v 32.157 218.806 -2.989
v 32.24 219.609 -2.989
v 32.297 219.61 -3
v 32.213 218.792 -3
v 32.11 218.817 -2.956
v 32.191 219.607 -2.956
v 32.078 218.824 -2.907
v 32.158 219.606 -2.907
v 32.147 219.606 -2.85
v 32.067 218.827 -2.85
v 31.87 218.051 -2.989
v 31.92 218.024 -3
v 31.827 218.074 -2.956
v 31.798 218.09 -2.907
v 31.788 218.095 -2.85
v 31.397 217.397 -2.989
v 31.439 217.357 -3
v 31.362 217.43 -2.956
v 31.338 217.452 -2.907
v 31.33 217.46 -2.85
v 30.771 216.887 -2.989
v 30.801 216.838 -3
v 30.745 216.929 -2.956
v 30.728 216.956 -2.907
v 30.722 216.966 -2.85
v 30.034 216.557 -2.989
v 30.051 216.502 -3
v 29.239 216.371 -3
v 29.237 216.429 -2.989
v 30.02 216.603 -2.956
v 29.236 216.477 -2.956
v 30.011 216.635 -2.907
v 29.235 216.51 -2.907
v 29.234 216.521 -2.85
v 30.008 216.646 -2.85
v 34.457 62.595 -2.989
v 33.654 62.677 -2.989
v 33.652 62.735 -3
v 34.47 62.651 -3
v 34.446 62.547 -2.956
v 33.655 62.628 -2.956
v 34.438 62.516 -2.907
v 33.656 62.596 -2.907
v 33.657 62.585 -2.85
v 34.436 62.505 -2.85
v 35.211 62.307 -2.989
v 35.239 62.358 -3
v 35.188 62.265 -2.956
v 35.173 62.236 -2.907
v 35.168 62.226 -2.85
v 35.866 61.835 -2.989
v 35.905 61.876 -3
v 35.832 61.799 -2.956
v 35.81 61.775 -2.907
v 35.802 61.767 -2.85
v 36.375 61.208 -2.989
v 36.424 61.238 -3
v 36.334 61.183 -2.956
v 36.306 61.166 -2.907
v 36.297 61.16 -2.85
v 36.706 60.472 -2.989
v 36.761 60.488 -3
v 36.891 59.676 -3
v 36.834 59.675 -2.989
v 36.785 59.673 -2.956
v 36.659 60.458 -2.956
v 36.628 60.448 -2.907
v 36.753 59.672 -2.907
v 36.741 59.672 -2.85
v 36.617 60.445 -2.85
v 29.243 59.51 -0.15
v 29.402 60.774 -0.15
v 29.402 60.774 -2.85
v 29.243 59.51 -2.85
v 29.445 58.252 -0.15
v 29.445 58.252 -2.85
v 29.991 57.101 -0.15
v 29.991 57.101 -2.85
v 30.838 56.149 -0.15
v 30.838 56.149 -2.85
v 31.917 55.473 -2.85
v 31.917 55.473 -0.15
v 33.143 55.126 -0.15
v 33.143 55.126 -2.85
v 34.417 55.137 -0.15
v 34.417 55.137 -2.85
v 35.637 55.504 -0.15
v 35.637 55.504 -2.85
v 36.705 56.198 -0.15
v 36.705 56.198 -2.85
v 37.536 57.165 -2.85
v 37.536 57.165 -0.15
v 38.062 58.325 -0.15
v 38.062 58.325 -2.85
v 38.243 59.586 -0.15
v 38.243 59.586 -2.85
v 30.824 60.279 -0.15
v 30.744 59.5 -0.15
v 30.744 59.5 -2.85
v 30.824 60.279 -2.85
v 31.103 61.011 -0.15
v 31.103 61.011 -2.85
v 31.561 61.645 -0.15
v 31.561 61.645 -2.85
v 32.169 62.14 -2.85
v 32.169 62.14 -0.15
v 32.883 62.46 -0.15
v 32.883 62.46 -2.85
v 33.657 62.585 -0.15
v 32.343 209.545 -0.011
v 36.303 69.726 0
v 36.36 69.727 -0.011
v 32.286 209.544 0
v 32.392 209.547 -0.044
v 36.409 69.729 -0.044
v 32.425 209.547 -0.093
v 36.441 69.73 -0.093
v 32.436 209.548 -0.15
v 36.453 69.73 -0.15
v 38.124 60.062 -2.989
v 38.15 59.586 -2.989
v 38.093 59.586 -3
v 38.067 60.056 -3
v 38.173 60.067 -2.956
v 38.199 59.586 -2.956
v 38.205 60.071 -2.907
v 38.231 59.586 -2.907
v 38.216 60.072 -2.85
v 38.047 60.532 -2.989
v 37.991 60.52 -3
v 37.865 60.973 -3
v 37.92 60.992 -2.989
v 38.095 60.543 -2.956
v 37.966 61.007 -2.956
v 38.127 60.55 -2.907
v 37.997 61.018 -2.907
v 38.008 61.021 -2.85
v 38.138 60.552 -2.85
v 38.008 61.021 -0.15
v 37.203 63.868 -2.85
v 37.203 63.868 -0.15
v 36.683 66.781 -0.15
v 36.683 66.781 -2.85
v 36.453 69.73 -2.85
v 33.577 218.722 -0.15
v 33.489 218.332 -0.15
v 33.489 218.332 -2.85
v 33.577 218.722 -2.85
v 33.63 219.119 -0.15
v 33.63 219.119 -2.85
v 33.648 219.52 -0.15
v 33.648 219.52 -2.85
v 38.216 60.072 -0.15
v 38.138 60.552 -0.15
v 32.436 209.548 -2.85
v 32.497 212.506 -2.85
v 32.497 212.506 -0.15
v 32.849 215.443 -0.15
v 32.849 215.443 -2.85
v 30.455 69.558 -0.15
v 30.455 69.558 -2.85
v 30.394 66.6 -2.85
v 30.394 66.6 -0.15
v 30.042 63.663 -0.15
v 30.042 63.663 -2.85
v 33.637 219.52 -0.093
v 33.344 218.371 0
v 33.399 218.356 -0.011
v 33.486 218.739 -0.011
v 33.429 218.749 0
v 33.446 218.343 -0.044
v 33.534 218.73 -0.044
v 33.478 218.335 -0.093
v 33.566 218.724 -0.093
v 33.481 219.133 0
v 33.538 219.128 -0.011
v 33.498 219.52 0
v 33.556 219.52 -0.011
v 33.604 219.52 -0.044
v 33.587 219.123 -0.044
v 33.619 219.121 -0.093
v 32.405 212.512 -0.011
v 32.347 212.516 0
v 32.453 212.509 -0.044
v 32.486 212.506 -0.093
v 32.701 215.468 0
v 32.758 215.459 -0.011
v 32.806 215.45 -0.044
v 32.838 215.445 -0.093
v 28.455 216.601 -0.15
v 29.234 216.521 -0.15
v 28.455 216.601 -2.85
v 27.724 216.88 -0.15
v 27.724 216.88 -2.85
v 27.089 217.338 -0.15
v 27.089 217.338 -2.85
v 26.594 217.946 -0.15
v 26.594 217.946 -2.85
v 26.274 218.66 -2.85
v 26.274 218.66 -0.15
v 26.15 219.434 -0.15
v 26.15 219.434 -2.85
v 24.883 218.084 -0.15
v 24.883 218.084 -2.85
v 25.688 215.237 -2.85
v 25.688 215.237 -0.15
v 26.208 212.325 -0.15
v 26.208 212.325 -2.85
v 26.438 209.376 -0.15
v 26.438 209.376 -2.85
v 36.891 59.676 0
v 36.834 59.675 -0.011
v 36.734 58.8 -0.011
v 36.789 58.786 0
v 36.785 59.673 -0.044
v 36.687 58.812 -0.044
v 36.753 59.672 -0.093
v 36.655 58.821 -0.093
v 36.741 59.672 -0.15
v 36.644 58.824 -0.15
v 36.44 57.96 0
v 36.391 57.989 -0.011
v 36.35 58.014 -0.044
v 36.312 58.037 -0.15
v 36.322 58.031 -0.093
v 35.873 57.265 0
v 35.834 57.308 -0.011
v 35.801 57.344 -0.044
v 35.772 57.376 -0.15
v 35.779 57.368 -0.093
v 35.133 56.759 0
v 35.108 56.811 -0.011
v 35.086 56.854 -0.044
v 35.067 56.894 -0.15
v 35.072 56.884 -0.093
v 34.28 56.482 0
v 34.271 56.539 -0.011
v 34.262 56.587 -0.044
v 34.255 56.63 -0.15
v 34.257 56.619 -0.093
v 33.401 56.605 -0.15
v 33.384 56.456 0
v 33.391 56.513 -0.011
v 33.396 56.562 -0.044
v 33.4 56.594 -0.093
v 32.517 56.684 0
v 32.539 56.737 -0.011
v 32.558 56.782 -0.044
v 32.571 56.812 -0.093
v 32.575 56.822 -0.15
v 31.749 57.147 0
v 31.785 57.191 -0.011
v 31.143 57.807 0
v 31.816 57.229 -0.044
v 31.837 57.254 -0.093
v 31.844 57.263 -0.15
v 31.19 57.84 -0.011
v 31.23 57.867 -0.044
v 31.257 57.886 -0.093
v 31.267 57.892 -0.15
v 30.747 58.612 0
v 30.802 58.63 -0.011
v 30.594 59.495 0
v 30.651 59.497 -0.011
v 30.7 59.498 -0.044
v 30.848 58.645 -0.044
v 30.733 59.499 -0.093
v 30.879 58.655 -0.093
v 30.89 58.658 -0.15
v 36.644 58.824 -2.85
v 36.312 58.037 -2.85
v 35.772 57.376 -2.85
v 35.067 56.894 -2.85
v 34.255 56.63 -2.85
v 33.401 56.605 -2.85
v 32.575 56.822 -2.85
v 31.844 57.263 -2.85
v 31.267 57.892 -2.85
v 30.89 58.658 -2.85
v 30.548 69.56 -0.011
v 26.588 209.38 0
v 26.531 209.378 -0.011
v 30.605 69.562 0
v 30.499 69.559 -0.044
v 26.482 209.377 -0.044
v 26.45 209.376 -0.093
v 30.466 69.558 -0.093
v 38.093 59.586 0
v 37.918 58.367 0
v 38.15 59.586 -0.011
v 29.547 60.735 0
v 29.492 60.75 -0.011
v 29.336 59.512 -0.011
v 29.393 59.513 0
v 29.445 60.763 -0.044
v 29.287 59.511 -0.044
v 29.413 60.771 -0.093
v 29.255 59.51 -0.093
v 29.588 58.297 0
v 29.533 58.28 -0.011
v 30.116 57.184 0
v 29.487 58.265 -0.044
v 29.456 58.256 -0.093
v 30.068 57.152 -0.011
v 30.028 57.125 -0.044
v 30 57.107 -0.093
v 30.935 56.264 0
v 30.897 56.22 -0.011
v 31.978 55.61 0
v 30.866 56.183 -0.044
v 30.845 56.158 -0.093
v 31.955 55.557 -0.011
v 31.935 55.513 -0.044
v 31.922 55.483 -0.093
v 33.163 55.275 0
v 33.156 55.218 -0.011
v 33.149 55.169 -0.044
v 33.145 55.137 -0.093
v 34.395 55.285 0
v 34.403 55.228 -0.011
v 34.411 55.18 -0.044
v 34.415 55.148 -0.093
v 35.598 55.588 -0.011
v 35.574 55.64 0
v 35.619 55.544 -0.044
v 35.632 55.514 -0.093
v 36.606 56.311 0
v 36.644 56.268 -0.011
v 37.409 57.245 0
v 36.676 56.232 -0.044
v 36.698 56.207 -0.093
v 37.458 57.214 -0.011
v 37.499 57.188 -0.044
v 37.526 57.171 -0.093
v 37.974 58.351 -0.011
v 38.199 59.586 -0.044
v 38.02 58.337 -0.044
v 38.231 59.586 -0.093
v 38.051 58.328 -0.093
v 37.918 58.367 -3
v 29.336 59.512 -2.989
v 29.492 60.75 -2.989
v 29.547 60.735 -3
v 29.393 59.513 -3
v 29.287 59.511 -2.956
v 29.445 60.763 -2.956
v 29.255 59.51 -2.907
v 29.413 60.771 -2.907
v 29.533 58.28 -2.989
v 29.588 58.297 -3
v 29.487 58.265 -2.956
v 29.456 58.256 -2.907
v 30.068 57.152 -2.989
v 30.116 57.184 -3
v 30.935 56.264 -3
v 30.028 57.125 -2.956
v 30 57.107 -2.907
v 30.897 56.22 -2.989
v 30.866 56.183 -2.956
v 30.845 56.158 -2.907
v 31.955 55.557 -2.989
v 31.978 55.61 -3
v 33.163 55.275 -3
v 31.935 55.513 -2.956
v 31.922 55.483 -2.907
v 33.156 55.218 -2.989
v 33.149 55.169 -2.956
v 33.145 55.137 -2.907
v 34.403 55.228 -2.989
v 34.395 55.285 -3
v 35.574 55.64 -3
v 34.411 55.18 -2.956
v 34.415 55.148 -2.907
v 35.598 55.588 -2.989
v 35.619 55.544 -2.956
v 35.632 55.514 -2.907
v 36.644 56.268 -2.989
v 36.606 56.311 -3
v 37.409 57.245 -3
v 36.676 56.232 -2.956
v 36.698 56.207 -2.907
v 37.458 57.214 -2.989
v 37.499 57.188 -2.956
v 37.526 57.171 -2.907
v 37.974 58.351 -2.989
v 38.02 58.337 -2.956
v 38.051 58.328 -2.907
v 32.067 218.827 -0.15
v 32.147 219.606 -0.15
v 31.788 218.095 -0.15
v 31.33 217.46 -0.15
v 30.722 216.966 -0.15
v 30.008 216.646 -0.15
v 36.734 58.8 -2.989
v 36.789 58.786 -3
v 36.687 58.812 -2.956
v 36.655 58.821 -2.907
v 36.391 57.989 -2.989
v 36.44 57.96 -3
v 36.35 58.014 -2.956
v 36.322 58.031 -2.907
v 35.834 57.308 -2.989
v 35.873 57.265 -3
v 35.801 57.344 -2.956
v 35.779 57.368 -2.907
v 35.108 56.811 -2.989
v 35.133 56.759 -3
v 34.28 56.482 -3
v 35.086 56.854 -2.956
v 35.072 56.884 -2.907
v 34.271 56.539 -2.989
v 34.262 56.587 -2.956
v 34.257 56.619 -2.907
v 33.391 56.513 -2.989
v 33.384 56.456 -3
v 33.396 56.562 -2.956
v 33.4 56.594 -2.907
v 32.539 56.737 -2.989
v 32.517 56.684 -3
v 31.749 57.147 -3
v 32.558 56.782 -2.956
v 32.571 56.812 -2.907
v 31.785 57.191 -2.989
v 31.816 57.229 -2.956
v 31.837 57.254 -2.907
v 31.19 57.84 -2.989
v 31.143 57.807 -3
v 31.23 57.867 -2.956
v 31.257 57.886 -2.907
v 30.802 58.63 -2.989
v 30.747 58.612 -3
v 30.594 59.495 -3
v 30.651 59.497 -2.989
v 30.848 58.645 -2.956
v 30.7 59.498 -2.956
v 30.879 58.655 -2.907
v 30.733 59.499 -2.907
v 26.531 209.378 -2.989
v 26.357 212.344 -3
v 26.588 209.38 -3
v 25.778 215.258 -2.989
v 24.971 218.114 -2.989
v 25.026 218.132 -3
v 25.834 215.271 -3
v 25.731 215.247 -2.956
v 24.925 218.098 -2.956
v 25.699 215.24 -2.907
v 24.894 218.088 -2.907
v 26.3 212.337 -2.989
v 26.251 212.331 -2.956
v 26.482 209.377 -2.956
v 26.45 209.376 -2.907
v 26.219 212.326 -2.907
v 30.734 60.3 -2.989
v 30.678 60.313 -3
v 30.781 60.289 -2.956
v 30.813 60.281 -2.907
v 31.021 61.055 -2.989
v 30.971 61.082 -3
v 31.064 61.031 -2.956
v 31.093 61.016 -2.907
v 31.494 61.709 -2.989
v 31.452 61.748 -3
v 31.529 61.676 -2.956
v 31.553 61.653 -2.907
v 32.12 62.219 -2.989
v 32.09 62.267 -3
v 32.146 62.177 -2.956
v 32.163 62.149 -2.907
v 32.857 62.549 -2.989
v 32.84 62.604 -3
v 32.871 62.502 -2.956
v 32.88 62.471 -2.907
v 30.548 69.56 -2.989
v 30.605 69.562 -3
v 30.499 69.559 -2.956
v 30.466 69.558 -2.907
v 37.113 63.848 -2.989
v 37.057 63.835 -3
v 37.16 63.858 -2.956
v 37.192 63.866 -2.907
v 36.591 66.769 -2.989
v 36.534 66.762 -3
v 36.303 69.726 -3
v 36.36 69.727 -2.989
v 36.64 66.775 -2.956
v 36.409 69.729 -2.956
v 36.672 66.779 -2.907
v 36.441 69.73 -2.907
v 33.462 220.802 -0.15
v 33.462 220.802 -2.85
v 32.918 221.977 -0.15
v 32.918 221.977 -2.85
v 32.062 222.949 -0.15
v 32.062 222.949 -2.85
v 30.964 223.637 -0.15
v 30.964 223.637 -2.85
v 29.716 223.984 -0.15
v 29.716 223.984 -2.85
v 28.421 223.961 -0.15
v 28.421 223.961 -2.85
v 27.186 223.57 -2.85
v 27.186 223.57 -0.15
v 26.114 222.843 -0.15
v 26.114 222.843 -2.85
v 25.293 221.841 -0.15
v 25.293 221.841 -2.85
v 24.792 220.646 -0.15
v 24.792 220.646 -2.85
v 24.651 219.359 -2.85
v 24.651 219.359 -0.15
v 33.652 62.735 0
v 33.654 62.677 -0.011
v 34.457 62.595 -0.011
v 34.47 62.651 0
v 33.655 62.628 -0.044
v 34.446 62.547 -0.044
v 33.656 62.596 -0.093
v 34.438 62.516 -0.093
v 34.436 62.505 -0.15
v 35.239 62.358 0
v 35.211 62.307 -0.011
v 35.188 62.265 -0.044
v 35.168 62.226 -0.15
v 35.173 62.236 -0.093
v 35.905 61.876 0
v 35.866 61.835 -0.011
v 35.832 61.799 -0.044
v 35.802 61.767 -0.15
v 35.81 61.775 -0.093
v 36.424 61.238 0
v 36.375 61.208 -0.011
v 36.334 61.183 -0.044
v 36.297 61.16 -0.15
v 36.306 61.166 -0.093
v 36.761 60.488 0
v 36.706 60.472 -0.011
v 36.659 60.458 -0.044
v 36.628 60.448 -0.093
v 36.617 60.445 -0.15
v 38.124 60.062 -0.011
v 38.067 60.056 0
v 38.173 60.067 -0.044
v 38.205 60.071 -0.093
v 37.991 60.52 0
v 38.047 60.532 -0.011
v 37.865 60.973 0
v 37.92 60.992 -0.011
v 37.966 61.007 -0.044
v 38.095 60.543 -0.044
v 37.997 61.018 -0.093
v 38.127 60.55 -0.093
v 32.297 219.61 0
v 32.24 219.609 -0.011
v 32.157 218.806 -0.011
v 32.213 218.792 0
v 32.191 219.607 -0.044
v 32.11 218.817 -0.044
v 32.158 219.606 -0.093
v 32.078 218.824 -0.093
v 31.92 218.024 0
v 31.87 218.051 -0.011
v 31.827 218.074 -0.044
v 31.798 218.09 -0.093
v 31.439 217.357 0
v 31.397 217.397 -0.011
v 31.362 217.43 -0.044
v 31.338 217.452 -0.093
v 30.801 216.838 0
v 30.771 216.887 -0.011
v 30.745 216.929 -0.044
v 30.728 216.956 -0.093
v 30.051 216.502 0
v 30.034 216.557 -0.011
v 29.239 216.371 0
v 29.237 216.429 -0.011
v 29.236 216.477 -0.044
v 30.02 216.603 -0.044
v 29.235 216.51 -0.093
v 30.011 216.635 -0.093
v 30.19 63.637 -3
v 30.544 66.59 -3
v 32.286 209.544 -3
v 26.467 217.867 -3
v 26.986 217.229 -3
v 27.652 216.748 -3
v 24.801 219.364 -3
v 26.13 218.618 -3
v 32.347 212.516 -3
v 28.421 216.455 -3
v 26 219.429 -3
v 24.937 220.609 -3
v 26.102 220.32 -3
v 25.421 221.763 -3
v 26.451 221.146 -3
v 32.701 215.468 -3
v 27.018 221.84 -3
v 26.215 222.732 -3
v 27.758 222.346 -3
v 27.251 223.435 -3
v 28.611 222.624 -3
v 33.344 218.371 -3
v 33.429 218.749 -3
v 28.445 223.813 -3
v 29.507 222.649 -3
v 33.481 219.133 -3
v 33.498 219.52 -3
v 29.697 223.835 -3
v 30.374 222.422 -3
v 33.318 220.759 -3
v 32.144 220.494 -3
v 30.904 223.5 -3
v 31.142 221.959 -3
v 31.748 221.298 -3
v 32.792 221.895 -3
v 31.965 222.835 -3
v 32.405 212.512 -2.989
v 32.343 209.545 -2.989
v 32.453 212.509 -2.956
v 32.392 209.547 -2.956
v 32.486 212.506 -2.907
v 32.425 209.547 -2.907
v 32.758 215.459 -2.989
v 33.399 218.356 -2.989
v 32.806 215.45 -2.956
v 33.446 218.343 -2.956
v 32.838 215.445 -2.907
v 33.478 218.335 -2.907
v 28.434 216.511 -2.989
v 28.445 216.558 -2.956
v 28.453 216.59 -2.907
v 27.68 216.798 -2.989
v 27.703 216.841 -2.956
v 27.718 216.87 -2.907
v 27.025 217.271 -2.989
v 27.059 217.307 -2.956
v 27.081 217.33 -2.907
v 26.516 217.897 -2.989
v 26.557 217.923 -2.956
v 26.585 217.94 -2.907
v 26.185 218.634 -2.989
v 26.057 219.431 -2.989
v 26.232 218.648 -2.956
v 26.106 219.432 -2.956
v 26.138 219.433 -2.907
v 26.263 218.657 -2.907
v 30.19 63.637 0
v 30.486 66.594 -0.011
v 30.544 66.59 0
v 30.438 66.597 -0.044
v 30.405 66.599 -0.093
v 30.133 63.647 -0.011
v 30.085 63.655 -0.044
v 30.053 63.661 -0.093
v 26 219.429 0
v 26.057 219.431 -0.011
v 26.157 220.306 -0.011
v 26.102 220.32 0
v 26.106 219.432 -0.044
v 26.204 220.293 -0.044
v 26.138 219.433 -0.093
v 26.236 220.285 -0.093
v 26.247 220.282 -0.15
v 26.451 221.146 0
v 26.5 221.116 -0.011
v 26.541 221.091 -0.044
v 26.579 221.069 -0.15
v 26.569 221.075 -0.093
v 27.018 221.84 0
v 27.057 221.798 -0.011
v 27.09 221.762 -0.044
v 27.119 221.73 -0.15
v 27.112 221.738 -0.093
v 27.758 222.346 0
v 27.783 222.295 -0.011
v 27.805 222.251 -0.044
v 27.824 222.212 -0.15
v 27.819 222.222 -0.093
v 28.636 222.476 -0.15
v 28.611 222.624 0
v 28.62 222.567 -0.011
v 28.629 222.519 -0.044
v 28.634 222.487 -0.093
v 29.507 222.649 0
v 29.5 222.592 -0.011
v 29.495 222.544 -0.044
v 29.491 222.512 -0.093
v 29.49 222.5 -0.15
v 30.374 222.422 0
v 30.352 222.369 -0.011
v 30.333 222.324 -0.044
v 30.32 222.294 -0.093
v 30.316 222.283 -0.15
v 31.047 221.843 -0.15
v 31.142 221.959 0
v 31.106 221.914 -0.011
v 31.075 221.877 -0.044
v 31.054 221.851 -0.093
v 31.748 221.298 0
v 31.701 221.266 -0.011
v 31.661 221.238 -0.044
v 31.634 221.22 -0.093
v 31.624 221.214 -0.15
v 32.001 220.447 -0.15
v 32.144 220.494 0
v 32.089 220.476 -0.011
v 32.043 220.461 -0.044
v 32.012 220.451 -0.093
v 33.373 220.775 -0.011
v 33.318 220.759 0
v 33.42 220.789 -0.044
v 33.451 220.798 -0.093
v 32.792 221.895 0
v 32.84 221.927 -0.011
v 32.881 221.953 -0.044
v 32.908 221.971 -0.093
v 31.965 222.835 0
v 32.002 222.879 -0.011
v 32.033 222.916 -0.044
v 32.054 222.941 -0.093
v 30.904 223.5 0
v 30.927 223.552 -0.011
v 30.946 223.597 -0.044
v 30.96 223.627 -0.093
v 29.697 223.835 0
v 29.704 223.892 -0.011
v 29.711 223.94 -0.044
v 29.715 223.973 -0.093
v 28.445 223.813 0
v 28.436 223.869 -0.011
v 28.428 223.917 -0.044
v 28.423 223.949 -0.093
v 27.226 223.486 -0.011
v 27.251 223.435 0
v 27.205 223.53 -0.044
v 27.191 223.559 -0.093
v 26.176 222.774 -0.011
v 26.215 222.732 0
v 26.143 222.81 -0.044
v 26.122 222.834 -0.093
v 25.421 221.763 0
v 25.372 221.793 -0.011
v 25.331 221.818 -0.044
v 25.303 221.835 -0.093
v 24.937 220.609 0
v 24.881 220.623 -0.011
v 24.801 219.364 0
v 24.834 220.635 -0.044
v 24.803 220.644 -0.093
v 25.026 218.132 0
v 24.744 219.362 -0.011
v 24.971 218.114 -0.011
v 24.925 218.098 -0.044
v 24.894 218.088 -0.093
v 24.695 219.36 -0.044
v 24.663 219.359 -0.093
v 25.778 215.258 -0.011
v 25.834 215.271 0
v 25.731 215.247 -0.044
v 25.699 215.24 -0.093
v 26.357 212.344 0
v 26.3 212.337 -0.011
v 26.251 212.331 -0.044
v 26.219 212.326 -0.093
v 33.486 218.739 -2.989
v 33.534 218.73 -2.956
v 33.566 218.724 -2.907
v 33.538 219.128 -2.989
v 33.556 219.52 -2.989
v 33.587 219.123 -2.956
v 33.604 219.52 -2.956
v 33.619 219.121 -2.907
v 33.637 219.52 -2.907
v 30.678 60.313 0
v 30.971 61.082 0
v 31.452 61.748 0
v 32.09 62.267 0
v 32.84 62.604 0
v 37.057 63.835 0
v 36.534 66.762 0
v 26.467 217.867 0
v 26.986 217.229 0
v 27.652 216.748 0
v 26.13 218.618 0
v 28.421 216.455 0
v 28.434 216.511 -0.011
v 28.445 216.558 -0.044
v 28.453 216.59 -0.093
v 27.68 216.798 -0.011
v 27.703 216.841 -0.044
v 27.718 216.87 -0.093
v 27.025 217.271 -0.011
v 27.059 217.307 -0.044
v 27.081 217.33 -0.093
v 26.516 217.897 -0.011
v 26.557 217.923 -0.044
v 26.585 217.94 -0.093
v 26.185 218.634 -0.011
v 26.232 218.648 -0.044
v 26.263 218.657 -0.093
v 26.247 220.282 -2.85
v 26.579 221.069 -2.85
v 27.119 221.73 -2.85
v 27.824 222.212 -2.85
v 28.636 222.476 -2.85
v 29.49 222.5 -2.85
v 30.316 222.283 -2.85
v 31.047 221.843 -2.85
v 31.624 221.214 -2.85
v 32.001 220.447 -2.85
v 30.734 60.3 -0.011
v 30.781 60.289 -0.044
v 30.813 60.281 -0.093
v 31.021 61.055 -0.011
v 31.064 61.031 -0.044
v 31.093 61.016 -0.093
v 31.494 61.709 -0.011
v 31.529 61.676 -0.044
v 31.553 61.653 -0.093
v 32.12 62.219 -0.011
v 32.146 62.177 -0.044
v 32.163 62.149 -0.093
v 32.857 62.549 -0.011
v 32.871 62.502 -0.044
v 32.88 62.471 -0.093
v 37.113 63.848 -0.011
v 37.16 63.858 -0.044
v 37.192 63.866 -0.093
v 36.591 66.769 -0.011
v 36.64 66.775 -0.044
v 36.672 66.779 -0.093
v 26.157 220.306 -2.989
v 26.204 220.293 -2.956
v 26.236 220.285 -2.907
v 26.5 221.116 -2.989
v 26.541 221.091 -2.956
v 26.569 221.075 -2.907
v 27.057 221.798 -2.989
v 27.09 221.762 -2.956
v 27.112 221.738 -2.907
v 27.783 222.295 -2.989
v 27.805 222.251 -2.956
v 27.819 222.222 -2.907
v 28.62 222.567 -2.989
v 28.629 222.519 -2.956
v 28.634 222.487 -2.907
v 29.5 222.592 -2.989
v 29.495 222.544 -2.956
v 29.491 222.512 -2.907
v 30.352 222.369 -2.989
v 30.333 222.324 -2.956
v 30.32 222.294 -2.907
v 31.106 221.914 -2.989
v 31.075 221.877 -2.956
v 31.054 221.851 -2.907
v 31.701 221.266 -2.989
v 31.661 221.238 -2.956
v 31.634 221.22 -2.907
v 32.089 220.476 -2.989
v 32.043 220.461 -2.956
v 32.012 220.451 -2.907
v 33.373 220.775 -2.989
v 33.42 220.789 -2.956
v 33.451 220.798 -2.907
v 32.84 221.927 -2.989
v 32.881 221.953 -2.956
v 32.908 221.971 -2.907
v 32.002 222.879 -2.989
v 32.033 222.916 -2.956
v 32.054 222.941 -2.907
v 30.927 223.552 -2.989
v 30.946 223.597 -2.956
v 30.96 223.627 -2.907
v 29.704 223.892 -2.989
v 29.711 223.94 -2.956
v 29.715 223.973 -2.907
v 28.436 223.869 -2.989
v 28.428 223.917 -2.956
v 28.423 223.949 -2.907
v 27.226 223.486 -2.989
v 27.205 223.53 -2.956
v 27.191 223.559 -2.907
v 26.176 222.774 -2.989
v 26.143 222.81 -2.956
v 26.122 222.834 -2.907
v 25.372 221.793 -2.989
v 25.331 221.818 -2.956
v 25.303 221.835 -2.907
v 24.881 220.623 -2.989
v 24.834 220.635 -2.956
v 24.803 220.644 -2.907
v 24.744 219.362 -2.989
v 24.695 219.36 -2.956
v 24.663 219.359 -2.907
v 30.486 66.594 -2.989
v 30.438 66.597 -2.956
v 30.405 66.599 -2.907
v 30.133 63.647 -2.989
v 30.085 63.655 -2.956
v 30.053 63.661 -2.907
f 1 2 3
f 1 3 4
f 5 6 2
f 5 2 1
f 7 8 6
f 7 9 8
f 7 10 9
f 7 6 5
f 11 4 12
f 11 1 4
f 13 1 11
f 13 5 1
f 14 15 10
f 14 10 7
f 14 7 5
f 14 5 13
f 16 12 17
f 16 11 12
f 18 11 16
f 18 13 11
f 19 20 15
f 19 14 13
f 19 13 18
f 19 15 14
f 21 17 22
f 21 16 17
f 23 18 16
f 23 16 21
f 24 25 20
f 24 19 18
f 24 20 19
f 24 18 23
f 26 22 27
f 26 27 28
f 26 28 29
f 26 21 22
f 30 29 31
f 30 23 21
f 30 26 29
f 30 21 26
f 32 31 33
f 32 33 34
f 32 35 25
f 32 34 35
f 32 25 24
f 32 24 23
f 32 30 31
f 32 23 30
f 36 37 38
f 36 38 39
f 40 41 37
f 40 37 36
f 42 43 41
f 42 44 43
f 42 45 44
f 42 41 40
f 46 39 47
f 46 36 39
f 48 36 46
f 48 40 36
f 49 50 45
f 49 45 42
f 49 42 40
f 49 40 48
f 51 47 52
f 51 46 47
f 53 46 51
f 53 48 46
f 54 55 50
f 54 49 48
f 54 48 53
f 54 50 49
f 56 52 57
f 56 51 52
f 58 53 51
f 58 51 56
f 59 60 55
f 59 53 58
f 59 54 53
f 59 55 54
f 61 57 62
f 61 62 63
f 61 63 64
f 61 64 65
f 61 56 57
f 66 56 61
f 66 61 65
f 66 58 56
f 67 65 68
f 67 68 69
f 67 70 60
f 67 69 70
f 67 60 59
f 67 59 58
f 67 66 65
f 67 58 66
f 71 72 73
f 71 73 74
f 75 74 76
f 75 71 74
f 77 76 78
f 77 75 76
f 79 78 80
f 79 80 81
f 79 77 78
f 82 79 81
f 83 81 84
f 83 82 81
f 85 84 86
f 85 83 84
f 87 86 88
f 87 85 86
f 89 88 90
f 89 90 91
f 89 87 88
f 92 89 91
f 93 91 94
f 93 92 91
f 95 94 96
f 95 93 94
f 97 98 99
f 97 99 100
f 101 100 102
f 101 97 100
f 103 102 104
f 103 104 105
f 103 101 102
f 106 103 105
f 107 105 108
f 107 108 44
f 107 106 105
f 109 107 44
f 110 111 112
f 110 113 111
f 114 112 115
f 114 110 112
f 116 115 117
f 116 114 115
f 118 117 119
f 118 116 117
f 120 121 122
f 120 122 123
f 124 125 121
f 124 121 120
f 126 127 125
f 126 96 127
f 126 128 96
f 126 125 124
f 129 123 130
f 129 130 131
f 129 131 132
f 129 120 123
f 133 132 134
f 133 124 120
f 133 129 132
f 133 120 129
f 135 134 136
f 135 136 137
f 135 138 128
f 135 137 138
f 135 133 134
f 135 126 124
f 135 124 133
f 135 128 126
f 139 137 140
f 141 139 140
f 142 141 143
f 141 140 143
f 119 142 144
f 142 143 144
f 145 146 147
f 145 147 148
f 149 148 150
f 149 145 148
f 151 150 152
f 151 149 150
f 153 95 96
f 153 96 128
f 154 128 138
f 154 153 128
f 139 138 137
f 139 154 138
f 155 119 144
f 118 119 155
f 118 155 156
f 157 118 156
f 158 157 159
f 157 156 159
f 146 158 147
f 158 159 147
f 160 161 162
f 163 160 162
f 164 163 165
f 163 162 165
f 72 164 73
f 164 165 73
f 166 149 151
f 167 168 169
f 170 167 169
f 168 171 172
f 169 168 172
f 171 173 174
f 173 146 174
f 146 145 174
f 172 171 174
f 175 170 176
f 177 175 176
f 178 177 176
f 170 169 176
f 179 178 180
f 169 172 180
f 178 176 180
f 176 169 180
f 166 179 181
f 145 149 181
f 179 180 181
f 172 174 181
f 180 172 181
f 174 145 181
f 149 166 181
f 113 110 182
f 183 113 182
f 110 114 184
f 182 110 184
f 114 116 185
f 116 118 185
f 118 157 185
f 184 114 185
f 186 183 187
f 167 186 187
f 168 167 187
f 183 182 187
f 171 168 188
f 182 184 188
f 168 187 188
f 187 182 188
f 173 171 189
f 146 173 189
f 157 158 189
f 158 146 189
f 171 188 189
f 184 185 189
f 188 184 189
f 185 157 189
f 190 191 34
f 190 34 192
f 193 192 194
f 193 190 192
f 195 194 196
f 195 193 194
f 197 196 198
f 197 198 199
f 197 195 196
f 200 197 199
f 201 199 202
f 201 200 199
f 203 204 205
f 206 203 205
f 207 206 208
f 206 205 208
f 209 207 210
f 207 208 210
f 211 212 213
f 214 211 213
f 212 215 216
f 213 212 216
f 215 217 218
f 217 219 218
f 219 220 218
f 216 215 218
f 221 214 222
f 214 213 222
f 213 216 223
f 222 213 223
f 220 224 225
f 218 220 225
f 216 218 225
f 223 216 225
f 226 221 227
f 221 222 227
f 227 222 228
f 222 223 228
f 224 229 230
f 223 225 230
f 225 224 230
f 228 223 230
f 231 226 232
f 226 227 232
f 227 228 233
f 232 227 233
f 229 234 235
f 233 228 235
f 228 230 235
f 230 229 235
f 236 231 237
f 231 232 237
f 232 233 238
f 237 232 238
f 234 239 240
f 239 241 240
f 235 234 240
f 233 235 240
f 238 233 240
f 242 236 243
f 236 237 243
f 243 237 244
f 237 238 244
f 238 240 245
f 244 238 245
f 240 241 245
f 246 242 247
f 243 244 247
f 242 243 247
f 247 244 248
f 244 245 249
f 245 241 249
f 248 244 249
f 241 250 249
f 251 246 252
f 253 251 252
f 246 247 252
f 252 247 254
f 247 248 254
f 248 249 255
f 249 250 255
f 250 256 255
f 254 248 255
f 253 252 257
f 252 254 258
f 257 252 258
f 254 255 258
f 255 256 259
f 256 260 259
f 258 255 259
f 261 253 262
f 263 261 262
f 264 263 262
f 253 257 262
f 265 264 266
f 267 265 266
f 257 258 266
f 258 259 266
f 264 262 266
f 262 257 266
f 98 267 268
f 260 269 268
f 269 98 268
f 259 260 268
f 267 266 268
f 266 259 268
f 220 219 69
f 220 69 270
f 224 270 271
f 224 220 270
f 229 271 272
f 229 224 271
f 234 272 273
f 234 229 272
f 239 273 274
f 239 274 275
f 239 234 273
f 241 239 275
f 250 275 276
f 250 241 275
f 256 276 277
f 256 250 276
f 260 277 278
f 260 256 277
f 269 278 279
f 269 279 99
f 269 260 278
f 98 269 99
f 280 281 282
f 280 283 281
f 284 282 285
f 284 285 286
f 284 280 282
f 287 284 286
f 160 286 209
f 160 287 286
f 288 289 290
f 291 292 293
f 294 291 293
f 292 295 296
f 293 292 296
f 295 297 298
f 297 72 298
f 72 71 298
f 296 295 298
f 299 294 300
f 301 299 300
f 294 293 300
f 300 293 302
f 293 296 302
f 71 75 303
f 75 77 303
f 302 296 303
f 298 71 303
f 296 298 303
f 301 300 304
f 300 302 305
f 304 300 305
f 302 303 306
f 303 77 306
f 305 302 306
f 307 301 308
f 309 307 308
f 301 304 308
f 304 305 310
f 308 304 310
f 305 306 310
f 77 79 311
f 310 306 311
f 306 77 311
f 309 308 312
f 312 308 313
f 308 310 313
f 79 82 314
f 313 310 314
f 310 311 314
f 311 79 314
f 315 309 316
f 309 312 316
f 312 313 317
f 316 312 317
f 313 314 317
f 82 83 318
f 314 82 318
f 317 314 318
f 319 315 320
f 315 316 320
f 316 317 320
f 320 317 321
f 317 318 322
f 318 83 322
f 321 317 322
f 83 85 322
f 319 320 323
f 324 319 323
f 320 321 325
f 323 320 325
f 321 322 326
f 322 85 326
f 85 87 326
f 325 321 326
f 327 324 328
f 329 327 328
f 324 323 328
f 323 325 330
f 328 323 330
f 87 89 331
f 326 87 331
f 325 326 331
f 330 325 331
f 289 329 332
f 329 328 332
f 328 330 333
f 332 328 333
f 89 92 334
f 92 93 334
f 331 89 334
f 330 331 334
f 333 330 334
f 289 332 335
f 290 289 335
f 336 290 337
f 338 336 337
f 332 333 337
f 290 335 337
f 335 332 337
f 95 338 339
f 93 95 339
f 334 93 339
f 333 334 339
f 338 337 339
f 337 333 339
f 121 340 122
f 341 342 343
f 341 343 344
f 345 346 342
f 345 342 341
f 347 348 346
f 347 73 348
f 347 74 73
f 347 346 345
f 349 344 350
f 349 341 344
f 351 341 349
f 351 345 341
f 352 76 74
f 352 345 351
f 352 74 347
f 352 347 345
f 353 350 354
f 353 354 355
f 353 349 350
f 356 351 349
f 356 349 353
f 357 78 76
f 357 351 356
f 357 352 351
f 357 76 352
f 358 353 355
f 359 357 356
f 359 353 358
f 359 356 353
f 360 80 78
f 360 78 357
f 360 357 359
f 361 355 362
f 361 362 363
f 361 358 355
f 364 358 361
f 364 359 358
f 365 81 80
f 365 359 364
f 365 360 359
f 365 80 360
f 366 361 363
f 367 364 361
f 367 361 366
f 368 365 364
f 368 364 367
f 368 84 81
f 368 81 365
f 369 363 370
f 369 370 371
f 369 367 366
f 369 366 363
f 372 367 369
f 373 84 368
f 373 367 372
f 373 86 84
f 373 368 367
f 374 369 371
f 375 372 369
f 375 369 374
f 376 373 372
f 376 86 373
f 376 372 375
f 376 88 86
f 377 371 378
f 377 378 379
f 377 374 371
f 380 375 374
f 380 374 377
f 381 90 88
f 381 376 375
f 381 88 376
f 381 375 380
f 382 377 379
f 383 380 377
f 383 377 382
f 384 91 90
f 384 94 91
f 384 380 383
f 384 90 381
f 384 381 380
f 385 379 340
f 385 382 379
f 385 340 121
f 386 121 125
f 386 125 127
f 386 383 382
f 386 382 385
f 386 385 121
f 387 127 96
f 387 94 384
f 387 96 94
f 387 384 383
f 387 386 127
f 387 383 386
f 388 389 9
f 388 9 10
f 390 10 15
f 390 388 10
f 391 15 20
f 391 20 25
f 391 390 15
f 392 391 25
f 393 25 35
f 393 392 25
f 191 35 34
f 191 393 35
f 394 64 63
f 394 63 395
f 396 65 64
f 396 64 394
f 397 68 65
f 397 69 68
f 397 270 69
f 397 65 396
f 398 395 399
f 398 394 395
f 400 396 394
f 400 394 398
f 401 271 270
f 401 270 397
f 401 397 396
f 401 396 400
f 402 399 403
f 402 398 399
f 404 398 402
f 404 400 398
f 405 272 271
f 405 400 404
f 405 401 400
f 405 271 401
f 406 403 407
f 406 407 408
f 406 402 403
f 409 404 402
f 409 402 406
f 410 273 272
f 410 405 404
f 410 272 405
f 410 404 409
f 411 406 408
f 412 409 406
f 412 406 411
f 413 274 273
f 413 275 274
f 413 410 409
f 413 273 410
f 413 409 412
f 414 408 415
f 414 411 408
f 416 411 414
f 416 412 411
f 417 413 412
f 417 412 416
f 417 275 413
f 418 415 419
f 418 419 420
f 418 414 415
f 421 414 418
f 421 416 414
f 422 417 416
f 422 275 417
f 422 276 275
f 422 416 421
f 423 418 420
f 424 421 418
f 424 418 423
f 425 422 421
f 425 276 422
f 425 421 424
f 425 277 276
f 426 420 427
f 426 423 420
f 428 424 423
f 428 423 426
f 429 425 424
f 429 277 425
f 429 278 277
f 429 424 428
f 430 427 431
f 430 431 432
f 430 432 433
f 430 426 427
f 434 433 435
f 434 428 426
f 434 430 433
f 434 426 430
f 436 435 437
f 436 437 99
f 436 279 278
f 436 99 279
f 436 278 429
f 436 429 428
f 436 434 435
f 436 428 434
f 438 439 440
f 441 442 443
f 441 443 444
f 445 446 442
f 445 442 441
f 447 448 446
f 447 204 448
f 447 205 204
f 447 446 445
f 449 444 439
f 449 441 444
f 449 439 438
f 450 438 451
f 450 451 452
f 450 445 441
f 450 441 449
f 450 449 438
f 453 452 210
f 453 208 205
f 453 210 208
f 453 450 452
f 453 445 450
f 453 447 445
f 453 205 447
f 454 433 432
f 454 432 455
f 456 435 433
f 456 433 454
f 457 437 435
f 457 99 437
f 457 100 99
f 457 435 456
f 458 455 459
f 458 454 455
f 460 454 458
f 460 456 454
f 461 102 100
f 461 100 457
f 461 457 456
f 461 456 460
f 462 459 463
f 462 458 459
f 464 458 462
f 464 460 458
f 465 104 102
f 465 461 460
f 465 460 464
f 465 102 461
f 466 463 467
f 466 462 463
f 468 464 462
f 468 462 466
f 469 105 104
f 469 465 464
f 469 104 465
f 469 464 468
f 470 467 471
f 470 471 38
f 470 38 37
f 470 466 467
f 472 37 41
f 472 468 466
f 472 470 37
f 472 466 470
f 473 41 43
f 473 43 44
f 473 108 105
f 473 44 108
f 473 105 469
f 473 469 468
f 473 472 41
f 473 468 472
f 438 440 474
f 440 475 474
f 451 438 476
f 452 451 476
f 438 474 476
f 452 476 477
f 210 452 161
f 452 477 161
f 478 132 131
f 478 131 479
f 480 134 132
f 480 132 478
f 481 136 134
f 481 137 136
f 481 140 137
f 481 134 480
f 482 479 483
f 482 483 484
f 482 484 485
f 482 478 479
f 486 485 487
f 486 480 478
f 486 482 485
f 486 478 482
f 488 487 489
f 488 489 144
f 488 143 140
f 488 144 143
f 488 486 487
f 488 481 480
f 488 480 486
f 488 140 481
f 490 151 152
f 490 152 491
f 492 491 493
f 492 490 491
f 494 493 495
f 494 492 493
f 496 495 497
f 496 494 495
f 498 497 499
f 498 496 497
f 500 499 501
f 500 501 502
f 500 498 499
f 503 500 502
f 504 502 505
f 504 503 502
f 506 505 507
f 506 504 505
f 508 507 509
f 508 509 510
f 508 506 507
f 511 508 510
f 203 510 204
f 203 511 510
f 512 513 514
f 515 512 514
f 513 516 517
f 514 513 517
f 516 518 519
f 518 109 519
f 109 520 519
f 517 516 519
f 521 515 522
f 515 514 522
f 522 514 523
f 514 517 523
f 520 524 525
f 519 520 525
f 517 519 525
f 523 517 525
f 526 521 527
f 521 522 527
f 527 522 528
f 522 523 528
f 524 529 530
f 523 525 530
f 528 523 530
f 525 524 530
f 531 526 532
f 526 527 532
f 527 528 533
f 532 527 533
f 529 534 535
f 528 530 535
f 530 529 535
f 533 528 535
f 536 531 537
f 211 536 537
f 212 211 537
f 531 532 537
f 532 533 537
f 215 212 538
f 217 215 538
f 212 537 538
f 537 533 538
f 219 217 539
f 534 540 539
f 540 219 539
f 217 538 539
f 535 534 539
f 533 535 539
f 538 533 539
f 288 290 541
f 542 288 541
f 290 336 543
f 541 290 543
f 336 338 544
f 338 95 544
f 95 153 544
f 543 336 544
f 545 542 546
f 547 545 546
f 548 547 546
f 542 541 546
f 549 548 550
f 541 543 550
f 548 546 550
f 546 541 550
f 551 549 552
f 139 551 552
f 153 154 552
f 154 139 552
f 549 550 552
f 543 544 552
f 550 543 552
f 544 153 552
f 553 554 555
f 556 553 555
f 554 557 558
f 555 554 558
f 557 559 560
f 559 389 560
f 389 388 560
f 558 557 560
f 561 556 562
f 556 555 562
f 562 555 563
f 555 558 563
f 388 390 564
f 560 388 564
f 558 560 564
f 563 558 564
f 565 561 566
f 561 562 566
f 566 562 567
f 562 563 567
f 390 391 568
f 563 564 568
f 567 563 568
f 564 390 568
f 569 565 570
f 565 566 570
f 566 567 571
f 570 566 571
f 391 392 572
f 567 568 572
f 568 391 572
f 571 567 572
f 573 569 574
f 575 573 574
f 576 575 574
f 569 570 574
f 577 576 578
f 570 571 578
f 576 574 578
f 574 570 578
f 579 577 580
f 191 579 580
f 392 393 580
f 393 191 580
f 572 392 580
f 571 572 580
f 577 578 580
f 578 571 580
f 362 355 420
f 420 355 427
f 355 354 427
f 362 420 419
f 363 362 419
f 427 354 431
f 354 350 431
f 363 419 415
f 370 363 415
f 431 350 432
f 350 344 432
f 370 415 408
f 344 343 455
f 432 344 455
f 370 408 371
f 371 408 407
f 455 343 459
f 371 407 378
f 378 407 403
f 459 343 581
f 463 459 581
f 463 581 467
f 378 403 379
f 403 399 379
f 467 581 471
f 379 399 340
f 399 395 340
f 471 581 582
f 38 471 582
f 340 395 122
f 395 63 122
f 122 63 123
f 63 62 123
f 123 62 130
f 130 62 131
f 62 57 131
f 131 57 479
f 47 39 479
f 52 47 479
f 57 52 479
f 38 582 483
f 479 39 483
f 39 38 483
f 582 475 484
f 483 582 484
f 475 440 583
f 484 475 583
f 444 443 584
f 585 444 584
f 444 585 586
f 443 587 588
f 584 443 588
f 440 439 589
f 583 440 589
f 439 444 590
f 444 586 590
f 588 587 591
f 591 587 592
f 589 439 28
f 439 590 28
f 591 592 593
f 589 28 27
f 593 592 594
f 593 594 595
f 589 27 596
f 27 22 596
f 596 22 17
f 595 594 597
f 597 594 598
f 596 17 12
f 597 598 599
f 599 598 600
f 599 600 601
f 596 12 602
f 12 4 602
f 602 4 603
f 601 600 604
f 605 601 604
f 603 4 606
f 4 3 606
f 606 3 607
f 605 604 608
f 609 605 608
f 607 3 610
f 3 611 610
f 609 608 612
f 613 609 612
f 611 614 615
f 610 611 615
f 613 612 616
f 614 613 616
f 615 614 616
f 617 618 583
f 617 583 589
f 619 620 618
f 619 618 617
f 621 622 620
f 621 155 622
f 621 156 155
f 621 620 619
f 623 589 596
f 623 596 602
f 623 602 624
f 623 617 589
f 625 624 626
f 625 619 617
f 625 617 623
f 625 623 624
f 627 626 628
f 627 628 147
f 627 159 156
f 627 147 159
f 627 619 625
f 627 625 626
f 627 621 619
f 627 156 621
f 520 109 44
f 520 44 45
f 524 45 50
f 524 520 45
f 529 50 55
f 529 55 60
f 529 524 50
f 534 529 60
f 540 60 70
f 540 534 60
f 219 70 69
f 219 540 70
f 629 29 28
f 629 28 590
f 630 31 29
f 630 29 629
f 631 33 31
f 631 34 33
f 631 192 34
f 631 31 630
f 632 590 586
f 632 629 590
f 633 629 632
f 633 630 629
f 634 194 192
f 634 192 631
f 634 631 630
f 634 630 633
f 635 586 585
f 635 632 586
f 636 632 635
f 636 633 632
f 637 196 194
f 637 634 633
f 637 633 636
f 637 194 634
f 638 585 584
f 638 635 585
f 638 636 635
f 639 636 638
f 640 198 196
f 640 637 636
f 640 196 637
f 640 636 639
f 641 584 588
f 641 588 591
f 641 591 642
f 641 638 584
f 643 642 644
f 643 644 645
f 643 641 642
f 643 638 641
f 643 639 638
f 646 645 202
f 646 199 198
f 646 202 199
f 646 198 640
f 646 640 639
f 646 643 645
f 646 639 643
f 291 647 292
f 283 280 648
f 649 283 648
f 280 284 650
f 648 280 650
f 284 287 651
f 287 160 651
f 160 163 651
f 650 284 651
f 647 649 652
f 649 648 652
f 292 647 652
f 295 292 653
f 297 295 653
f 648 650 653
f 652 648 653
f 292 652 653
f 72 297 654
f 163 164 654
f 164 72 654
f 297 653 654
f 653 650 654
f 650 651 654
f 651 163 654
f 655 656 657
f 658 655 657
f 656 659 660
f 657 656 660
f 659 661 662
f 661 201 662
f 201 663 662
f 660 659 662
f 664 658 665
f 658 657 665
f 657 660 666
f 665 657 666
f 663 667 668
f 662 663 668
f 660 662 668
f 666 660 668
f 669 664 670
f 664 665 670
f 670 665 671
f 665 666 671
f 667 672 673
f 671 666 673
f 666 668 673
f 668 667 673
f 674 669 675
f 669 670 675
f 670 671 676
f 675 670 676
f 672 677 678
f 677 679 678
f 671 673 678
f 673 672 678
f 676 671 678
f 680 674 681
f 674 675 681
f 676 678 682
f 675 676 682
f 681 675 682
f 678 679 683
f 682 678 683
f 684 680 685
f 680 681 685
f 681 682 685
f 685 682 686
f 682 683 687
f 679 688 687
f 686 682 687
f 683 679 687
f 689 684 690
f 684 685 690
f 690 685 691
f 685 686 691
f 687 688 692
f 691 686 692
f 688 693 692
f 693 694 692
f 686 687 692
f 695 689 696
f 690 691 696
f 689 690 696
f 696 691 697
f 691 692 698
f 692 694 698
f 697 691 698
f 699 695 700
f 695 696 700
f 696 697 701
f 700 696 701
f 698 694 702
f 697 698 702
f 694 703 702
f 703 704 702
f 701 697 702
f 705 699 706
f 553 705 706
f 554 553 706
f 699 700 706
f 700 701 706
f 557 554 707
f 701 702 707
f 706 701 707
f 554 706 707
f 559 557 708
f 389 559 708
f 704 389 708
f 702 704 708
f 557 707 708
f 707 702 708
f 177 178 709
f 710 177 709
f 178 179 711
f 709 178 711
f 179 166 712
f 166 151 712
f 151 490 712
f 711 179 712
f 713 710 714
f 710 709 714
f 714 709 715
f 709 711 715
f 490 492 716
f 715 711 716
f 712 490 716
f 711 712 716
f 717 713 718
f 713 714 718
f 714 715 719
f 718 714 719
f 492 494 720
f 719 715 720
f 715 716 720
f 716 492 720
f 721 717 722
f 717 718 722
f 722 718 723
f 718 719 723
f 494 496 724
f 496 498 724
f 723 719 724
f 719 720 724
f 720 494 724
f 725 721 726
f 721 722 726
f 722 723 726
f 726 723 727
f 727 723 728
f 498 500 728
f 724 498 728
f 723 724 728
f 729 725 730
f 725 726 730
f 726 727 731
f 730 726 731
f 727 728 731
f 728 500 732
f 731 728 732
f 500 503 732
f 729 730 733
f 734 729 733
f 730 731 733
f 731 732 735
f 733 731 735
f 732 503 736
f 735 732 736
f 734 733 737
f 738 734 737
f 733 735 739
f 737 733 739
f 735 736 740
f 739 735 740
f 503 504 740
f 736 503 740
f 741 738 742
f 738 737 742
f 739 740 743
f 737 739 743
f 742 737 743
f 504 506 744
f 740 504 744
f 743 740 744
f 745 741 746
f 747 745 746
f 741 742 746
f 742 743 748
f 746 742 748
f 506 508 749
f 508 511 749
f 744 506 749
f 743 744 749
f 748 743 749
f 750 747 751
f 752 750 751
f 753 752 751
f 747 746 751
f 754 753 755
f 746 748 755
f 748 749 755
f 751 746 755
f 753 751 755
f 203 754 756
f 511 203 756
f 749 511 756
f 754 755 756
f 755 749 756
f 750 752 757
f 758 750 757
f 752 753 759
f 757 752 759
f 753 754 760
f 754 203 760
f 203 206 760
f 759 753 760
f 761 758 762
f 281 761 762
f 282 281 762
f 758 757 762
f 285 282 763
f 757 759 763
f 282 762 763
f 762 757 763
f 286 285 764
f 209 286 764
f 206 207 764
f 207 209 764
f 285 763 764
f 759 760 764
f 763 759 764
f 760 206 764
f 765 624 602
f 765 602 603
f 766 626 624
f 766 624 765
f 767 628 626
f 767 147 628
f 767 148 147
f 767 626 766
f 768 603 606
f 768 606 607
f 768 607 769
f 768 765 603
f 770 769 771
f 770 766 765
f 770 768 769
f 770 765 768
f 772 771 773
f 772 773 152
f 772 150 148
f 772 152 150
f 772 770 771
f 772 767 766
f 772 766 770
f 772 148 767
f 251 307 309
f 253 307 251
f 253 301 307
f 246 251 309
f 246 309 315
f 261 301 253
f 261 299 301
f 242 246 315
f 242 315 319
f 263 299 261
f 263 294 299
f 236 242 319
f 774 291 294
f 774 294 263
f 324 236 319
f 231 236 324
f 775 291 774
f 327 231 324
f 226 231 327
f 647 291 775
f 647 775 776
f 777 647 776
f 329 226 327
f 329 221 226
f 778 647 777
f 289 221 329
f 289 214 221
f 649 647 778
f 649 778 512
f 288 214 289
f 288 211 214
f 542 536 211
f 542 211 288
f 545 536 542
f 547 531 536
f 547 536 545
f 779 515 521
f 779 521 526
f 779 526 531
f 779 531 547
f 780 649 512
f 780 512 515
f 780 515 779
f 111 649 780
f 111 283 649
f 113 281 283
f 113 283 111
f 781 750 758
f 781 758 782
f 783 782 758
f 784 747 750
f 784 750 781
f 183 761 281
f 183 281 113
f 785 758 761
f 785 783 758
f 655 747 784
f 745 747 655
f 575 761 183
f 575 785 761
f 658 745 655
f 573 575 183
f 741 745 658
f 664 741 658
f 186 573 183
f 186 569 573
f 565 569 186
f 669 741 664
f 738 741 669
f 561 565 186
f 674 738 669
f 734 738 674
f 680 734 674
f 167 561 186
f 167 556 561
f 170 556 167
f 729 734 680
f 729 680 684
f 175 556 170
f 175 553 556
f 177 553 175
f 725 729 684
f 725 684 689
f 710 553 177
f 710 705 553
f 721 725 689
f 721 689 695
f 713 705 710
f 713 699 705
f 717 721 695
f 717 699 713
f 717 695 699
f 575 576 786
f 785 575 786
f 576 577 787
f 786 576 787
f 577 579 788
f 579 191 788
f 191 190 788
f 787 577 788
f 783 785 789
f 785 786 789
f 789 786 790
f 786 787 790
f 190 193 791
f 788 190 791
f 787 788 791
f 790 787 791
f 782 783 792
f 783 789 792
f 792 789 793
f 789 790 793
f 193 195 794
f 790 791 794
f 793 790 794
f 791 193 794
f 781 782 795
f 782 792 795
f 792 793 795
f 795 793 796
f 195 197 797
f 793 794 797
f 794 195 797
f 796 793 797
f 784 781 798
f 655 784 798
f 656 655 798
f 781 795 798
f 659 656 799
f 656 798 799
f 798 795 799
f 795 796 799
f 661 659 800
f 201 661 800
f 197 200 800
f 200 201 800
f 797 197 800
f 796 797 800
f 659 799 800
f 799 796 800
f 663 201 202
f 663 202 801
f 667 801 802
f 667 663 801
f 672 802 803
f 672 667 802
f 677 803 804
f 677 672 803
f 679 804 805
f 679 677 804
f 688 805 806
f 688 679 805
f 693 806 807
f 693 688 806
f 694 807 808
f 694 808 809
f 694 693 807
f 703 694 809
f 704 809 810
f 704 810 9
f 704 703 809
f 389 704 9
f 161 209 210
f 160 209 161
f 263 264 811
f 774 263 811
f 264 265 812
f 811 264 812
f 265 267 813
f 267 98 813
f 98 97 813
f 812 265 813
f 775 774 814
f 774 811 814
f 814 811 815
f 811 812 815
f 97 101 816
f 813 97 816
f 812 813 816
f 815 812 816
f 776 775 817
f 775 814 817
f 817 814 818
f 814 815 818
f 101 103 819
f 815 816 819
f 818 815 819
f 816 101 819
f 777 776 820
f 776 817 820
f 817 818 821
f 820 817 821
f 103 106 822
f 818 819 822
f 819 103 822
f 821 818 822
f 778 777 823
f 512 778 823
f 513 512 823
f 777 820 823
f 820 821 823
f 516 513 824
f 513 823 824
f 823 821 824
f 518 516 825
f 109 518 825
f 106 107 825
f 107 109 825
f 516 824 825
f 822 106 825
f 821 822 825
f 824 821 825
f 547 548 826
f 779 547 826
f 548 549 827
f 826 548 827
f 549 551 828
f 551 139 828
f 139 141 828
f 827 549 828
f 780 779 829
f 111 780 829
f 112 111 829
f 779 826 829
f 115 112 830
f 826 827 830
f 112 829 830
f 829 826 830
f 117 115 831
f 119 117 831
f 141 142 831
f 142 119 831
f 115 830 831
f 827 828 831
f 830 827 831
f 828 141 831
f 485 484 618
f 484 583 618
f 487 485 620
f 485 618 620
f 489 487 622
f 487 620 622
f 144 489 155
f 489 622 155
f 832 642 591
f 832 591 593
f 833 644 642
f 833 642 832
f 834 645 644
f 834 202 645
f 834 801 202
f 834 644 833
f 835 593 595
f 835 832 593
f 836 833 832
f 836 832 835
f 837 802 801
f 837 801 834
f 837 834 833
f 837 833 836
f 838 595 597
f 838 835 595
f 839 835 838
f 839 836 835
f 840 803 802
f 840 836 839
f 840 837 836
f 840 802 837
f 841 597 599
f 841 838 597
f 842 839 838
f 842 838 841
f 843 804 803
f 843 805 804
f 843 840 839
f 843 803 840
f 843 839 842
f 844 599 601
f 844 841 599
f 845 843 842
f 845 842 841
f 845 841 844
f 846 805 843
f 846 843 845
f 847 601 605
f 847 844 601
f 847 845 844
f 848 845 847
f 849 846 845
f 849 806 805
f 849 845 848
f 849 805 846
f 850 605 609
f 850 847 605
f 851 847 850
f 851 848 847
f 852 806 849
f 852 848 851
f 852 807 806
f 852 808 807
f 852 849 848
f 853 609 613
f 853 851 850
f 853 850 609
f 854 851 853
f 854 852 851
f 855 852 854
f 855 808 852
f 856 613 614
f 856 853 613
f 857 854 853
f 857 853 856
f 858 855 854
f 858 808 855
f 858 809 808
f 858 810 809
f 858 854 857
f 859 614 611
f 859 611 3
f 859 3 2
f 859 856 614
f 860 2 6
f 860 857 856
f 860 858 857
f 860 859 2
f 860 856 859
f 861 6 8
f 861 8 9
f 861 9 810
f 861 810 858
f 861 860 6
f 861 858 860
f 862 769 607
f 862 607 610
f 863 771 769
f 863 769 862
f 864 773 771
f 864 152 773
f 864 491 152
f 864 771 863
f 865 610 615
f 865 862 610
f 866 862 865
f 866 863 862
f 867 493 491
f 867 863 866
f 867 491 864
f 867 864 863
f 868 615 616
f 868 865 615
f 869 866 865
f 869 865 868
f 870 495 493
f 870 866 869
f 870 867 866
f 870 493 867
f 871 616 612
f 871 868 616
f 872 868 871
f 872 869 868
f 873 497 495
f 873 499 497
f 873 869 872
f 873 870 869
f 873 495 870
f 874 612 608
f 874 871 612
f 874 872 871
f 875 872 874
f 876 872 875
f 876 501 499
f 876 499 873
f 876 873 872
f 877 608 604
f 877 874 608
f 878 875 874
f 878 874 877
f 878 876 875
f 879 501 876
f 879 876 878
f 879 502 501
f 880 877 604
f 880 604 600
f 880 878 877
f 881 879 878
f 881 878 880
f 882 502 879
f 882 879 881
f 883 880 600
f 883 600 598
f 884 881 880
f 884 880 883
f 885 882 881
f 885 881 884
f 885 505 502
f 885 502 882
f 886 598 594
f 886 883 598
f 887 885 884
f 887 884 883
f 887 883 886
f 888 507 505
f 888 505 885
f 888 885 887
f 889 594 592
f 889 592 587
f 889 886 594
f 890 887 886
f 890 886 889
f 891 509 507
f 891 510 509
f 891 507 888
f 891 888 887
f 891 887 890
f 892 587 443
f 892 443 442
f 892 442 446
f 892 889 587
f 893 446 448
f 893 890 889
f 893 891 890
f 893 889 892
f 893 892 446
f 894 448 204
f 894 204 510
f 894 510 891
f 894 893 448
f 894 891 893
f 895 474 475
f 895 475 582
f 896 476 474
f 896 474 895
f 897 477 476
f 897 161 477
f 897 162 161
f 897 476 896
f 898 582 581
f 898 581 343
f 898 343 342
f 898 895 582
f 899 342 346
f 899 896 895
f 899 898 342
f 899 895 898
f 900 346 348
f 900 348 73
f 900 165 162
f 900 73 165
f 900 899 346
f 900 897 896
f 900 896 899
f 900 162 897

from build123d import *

# Parameters (mm, degrees)
BOSS_EXTRUDE3_DEPTH = 3
FILLET5_R           = 30
FILLET6_R           = 0.15


with BuildPart() as part:
    # Sketch2 → Boss-Extrude3 (new body)
    with BuildSketch(Plane.XY):
        with BuildLine():
            ThreePointArc((33.648285301, 219.519834824), (27.252371234, 223.600951075), (26.245836478, 216.080970066))
            Line((26.245836478, 216.080970066), (26.149522409, 219.433688903))
            ThreePointArc((26.149522409, 219.433688903), (29.062139379, 222.518597716), (32.147048192, 219.605980746))
            Line((32.147048192, 219.605980746), (32.243362261, 216.253261909))
            ThreePointArc((32.243362261, 216.253261909), (33.282160379, 217.741893082), (33.648285301, 219.519834824))
        make_face()
        with BuildLine():
            ThreePointArc((26.245836478, 216.080970066), (27.663960747, 215.271684566), (29.277504183, 215.021690487))
            Line((29.277504183, 215.021690487), (29.234431223, 216.521071933))
            ThreePointArc((29.234431223, 216.521071933), (27.08875409, 217.338474883), (26.149522409, 219.433688903))
            Line((26.149522409, 219.433688903), (26.245836478, 216.080970066))
        make_face()
        with BuildLine():
            Line((29.234431223, 216.521071933), (29.277504183, 215.021690487))
            ThreePointArc((29.277504183, 215.021690487), (30.874035272, 215.36390087), (32.243362261, 216.253261909))
            Line((32.243362261, 216.253261909), (32.147048192, 219.605980746))
            ThreePointArc((32.147048192, 219.605980746), (31.329645242, 217.460303614), (29.234431223, 216.521071933))
        make_face()
        with BuildLine():
            ThreePointArc((30.6476575, 62.852386853), (32.016984489, 63.741747893), (33.613515578, 64.083958275))
            Line((33.613515578, 64.083958275), (29.277504183, 215.021690487))
            ThreePointArc((29.277504183, 215.021690487), (27.663960747, 215.271684566), (26.245836478, 216.080970066))
            Line((26.245836478, 216.080970066), (30.6476575, 62.852386853))
        make_face()
        with BuildLine():
            Line((29.277504183, 215.021690487), (33.613515578, 64.083958275))
            ThreePointArc((33.613515578, 64.083958275), (35.227059015, 63.833964196), (36.645183284, 63.024678697))
            Line((36.645183284, 63.024678697), (32.243362261, 216.253261909))
            ThreePointArc((32.243362261, 216.253261909), (30.874035272, 215.36390087), (29.277504183, 215.021690487))
        make_face()
        with BuildLine():
            ThreePointArc((30.743971569, 59.499668016), (31.561374519, 61.645345148), (33.656588539, 62.58457683))
            Line((33.656588539, 62.58457683), (33.613515578, 64.083958275))
            ThreePointArc((33.613515578, 64.083958275), (32.016984489, 63.741747893), (30.6476575, 62.852386853))
            Line((30.6476575, 62.852386853), (30.743971569, 59.499668016))
        make_face()
        with BuildLine():
            Line((33.613515578, 64.083958275), (33.656588539, 62.58457683))
            ThreePointArc((33.656588539, 62.58457683), (35.802265671, 61.767173879), (36.741497352, 59.67195986))
            Line((36.741497352, 59.67195986), (36.645183284, 63.024678697))
            ThreePointArc((36.645183284, 63.024678697), (35.227059015, 63.833964196), (33.613515578, 64.083958275))
        make_face()
        with BuildLine():
            ThreePointArc((36.741497352, 59.67195986), (33.828880382, 56.587051046), (30.743971569, 59.499668016))
            Line((30.743971569, 59.499668016), (30.6476575, 62.852386853))
            ThreePointArc((30.6476575, 62.852386853), (31.964792718, 55.45193886), (38.24273446, 59.585813938))
            ThreePointArc((38.24273446, 59.585813938), (37.823850711, 61.481728005), (36.645183284, 63.024678697))
            Line((36.645183284, 63.024678697), (36.741497352, 59.67195986))
        make_face()
    extrude(amount=-BOSS_EXTRUDE3_DEPTH)

    # Fillet5
    fillet5_edges = [part.edges().sort_by_distance(p)[0] for p in [
        (30.6476575, 62.852386853, -1.5),
        (26.245836478, 216.080970066, -1.5),
        (32.243362261, 216.253261909, -1.5),
        (36.645183284, 63.024678697, -1.5),
    ]]
    fillet(fillet5_edges, radius=FILLET5_R)

    # Fillet6
    fillet6_edges = [part.edges().sort_by_distance(p)[0] for p in [
        (34.444272772, 139.638970303, 0),
        (34.444272772, 139.638970303, -3),
        (26.149522409, 219.433688903, -3),
        (29.019066418, 224.017979162, 0),
        (29.019066418, 224.017979162, -3),
        (28.446746989, 139.466678459, 0),
        (28.446746989, 139.466678459, -3),
        (33.143223957, 55.125927487, 0),
        (33.143223957, 55.125927487, -3),
        (32.636718656, 213.97867404, 0),
        (30.743971569, 59.499668016, -3),
        (32.636718656, 213.97867404, -3),
        (25.983705892, 213.787551922, 0),
        (25.983705892, 213.787551922, -3),
        (30.254301105, 65.126974722, 0),
        (30.254301105, 65.126974722, -3),
        (36.907313869, 65.31809684, 0),
        (36.907313869, 65.31809684, -3),
        (30.743971569, 59.499668016, 0),
        (26.149522409, 219.433688903, 0),
    ]]
    fillet(fillet6_edges, radius=FILLET6_R)


solid = part.part
